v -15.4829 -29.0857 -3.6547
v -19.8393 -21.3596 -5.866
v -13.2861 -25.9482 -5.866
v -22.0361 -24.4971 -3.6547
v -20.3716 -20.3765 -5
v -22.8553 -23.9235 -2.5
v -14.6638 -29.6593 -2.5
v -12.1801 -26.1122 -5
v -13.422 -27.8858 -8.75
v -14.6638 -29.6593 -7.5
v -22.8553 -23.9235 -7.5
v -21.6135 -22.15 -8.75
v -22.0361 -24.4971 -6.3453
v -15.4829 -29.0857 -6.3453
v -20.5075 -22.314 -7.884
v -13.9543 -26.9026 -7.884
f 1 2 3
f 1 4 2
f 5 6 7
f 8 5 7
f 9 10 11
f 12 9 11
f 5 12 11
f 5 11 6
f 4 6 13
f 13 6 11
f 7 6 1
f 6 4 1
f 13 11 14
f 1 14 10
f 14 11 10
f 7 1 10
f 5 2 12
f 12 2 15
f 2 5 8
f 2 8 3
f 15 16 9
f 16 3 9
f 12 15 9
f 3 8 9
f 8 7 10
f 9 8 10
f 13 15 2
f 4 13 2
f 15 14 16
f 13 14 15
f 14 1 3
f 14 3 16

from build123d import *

# Parameters (mm, degrees)
F3_W     = 10
F3_H     = 5
F8_DEPTH = 10
F9_T     = -1


with BuildPart() as f6:
    # F6: sweep along a path in F5
    with BuildLine(Plane(origin=(0, 0, 0), x_dir=(0.5735764364, 0.8191520443, 0), z_dir=(0.8191520443, -0.5735764364, 0))) as f6_path:
        Line((-28.3761330307, -7.5), (-32.7062600496, -5))
    # F3 (on line) → F6 (sweep)
    with BuildSketch(Plane(origin=(-18.7595400856, -26.7913997807, 0), x_dir=(-0.8191520443, 0.5735764364, 0), z_dir=(0.5735764364, 0.8191520443, 0))):
        with Locations((0, -5)):
            Rectangle(F3_W, F3_H)
    sweep(path=f6_path.line)

    # F7 (on face) → F8 (cut, through all)
    with BuildSketch(Plane(origin=(4.0957602214, -2.8678821818, 0), x_dir=(0.5735764364, 0.8191520443, 0), z_dir=(0.8191520443, -0.5735764364, 0))):
        Polygon((-28.3761330307, -10), (-28.3761330307, -5), (-30.5411965402, -8.75), align=None)
    extrude(amount=-F8_DEPTH, mode=Mode.SUBTRACT)

    # F9
    f9_openings = [f6.faces().sort_by_distance(p)[0] for p in [
        (-16.896796, -24.131125, -6.875),
        (-18.75954, -26.7914, -5),
    ]]
    offset(amount=F9_T, openings=f9_openings)


solid = f6.part
